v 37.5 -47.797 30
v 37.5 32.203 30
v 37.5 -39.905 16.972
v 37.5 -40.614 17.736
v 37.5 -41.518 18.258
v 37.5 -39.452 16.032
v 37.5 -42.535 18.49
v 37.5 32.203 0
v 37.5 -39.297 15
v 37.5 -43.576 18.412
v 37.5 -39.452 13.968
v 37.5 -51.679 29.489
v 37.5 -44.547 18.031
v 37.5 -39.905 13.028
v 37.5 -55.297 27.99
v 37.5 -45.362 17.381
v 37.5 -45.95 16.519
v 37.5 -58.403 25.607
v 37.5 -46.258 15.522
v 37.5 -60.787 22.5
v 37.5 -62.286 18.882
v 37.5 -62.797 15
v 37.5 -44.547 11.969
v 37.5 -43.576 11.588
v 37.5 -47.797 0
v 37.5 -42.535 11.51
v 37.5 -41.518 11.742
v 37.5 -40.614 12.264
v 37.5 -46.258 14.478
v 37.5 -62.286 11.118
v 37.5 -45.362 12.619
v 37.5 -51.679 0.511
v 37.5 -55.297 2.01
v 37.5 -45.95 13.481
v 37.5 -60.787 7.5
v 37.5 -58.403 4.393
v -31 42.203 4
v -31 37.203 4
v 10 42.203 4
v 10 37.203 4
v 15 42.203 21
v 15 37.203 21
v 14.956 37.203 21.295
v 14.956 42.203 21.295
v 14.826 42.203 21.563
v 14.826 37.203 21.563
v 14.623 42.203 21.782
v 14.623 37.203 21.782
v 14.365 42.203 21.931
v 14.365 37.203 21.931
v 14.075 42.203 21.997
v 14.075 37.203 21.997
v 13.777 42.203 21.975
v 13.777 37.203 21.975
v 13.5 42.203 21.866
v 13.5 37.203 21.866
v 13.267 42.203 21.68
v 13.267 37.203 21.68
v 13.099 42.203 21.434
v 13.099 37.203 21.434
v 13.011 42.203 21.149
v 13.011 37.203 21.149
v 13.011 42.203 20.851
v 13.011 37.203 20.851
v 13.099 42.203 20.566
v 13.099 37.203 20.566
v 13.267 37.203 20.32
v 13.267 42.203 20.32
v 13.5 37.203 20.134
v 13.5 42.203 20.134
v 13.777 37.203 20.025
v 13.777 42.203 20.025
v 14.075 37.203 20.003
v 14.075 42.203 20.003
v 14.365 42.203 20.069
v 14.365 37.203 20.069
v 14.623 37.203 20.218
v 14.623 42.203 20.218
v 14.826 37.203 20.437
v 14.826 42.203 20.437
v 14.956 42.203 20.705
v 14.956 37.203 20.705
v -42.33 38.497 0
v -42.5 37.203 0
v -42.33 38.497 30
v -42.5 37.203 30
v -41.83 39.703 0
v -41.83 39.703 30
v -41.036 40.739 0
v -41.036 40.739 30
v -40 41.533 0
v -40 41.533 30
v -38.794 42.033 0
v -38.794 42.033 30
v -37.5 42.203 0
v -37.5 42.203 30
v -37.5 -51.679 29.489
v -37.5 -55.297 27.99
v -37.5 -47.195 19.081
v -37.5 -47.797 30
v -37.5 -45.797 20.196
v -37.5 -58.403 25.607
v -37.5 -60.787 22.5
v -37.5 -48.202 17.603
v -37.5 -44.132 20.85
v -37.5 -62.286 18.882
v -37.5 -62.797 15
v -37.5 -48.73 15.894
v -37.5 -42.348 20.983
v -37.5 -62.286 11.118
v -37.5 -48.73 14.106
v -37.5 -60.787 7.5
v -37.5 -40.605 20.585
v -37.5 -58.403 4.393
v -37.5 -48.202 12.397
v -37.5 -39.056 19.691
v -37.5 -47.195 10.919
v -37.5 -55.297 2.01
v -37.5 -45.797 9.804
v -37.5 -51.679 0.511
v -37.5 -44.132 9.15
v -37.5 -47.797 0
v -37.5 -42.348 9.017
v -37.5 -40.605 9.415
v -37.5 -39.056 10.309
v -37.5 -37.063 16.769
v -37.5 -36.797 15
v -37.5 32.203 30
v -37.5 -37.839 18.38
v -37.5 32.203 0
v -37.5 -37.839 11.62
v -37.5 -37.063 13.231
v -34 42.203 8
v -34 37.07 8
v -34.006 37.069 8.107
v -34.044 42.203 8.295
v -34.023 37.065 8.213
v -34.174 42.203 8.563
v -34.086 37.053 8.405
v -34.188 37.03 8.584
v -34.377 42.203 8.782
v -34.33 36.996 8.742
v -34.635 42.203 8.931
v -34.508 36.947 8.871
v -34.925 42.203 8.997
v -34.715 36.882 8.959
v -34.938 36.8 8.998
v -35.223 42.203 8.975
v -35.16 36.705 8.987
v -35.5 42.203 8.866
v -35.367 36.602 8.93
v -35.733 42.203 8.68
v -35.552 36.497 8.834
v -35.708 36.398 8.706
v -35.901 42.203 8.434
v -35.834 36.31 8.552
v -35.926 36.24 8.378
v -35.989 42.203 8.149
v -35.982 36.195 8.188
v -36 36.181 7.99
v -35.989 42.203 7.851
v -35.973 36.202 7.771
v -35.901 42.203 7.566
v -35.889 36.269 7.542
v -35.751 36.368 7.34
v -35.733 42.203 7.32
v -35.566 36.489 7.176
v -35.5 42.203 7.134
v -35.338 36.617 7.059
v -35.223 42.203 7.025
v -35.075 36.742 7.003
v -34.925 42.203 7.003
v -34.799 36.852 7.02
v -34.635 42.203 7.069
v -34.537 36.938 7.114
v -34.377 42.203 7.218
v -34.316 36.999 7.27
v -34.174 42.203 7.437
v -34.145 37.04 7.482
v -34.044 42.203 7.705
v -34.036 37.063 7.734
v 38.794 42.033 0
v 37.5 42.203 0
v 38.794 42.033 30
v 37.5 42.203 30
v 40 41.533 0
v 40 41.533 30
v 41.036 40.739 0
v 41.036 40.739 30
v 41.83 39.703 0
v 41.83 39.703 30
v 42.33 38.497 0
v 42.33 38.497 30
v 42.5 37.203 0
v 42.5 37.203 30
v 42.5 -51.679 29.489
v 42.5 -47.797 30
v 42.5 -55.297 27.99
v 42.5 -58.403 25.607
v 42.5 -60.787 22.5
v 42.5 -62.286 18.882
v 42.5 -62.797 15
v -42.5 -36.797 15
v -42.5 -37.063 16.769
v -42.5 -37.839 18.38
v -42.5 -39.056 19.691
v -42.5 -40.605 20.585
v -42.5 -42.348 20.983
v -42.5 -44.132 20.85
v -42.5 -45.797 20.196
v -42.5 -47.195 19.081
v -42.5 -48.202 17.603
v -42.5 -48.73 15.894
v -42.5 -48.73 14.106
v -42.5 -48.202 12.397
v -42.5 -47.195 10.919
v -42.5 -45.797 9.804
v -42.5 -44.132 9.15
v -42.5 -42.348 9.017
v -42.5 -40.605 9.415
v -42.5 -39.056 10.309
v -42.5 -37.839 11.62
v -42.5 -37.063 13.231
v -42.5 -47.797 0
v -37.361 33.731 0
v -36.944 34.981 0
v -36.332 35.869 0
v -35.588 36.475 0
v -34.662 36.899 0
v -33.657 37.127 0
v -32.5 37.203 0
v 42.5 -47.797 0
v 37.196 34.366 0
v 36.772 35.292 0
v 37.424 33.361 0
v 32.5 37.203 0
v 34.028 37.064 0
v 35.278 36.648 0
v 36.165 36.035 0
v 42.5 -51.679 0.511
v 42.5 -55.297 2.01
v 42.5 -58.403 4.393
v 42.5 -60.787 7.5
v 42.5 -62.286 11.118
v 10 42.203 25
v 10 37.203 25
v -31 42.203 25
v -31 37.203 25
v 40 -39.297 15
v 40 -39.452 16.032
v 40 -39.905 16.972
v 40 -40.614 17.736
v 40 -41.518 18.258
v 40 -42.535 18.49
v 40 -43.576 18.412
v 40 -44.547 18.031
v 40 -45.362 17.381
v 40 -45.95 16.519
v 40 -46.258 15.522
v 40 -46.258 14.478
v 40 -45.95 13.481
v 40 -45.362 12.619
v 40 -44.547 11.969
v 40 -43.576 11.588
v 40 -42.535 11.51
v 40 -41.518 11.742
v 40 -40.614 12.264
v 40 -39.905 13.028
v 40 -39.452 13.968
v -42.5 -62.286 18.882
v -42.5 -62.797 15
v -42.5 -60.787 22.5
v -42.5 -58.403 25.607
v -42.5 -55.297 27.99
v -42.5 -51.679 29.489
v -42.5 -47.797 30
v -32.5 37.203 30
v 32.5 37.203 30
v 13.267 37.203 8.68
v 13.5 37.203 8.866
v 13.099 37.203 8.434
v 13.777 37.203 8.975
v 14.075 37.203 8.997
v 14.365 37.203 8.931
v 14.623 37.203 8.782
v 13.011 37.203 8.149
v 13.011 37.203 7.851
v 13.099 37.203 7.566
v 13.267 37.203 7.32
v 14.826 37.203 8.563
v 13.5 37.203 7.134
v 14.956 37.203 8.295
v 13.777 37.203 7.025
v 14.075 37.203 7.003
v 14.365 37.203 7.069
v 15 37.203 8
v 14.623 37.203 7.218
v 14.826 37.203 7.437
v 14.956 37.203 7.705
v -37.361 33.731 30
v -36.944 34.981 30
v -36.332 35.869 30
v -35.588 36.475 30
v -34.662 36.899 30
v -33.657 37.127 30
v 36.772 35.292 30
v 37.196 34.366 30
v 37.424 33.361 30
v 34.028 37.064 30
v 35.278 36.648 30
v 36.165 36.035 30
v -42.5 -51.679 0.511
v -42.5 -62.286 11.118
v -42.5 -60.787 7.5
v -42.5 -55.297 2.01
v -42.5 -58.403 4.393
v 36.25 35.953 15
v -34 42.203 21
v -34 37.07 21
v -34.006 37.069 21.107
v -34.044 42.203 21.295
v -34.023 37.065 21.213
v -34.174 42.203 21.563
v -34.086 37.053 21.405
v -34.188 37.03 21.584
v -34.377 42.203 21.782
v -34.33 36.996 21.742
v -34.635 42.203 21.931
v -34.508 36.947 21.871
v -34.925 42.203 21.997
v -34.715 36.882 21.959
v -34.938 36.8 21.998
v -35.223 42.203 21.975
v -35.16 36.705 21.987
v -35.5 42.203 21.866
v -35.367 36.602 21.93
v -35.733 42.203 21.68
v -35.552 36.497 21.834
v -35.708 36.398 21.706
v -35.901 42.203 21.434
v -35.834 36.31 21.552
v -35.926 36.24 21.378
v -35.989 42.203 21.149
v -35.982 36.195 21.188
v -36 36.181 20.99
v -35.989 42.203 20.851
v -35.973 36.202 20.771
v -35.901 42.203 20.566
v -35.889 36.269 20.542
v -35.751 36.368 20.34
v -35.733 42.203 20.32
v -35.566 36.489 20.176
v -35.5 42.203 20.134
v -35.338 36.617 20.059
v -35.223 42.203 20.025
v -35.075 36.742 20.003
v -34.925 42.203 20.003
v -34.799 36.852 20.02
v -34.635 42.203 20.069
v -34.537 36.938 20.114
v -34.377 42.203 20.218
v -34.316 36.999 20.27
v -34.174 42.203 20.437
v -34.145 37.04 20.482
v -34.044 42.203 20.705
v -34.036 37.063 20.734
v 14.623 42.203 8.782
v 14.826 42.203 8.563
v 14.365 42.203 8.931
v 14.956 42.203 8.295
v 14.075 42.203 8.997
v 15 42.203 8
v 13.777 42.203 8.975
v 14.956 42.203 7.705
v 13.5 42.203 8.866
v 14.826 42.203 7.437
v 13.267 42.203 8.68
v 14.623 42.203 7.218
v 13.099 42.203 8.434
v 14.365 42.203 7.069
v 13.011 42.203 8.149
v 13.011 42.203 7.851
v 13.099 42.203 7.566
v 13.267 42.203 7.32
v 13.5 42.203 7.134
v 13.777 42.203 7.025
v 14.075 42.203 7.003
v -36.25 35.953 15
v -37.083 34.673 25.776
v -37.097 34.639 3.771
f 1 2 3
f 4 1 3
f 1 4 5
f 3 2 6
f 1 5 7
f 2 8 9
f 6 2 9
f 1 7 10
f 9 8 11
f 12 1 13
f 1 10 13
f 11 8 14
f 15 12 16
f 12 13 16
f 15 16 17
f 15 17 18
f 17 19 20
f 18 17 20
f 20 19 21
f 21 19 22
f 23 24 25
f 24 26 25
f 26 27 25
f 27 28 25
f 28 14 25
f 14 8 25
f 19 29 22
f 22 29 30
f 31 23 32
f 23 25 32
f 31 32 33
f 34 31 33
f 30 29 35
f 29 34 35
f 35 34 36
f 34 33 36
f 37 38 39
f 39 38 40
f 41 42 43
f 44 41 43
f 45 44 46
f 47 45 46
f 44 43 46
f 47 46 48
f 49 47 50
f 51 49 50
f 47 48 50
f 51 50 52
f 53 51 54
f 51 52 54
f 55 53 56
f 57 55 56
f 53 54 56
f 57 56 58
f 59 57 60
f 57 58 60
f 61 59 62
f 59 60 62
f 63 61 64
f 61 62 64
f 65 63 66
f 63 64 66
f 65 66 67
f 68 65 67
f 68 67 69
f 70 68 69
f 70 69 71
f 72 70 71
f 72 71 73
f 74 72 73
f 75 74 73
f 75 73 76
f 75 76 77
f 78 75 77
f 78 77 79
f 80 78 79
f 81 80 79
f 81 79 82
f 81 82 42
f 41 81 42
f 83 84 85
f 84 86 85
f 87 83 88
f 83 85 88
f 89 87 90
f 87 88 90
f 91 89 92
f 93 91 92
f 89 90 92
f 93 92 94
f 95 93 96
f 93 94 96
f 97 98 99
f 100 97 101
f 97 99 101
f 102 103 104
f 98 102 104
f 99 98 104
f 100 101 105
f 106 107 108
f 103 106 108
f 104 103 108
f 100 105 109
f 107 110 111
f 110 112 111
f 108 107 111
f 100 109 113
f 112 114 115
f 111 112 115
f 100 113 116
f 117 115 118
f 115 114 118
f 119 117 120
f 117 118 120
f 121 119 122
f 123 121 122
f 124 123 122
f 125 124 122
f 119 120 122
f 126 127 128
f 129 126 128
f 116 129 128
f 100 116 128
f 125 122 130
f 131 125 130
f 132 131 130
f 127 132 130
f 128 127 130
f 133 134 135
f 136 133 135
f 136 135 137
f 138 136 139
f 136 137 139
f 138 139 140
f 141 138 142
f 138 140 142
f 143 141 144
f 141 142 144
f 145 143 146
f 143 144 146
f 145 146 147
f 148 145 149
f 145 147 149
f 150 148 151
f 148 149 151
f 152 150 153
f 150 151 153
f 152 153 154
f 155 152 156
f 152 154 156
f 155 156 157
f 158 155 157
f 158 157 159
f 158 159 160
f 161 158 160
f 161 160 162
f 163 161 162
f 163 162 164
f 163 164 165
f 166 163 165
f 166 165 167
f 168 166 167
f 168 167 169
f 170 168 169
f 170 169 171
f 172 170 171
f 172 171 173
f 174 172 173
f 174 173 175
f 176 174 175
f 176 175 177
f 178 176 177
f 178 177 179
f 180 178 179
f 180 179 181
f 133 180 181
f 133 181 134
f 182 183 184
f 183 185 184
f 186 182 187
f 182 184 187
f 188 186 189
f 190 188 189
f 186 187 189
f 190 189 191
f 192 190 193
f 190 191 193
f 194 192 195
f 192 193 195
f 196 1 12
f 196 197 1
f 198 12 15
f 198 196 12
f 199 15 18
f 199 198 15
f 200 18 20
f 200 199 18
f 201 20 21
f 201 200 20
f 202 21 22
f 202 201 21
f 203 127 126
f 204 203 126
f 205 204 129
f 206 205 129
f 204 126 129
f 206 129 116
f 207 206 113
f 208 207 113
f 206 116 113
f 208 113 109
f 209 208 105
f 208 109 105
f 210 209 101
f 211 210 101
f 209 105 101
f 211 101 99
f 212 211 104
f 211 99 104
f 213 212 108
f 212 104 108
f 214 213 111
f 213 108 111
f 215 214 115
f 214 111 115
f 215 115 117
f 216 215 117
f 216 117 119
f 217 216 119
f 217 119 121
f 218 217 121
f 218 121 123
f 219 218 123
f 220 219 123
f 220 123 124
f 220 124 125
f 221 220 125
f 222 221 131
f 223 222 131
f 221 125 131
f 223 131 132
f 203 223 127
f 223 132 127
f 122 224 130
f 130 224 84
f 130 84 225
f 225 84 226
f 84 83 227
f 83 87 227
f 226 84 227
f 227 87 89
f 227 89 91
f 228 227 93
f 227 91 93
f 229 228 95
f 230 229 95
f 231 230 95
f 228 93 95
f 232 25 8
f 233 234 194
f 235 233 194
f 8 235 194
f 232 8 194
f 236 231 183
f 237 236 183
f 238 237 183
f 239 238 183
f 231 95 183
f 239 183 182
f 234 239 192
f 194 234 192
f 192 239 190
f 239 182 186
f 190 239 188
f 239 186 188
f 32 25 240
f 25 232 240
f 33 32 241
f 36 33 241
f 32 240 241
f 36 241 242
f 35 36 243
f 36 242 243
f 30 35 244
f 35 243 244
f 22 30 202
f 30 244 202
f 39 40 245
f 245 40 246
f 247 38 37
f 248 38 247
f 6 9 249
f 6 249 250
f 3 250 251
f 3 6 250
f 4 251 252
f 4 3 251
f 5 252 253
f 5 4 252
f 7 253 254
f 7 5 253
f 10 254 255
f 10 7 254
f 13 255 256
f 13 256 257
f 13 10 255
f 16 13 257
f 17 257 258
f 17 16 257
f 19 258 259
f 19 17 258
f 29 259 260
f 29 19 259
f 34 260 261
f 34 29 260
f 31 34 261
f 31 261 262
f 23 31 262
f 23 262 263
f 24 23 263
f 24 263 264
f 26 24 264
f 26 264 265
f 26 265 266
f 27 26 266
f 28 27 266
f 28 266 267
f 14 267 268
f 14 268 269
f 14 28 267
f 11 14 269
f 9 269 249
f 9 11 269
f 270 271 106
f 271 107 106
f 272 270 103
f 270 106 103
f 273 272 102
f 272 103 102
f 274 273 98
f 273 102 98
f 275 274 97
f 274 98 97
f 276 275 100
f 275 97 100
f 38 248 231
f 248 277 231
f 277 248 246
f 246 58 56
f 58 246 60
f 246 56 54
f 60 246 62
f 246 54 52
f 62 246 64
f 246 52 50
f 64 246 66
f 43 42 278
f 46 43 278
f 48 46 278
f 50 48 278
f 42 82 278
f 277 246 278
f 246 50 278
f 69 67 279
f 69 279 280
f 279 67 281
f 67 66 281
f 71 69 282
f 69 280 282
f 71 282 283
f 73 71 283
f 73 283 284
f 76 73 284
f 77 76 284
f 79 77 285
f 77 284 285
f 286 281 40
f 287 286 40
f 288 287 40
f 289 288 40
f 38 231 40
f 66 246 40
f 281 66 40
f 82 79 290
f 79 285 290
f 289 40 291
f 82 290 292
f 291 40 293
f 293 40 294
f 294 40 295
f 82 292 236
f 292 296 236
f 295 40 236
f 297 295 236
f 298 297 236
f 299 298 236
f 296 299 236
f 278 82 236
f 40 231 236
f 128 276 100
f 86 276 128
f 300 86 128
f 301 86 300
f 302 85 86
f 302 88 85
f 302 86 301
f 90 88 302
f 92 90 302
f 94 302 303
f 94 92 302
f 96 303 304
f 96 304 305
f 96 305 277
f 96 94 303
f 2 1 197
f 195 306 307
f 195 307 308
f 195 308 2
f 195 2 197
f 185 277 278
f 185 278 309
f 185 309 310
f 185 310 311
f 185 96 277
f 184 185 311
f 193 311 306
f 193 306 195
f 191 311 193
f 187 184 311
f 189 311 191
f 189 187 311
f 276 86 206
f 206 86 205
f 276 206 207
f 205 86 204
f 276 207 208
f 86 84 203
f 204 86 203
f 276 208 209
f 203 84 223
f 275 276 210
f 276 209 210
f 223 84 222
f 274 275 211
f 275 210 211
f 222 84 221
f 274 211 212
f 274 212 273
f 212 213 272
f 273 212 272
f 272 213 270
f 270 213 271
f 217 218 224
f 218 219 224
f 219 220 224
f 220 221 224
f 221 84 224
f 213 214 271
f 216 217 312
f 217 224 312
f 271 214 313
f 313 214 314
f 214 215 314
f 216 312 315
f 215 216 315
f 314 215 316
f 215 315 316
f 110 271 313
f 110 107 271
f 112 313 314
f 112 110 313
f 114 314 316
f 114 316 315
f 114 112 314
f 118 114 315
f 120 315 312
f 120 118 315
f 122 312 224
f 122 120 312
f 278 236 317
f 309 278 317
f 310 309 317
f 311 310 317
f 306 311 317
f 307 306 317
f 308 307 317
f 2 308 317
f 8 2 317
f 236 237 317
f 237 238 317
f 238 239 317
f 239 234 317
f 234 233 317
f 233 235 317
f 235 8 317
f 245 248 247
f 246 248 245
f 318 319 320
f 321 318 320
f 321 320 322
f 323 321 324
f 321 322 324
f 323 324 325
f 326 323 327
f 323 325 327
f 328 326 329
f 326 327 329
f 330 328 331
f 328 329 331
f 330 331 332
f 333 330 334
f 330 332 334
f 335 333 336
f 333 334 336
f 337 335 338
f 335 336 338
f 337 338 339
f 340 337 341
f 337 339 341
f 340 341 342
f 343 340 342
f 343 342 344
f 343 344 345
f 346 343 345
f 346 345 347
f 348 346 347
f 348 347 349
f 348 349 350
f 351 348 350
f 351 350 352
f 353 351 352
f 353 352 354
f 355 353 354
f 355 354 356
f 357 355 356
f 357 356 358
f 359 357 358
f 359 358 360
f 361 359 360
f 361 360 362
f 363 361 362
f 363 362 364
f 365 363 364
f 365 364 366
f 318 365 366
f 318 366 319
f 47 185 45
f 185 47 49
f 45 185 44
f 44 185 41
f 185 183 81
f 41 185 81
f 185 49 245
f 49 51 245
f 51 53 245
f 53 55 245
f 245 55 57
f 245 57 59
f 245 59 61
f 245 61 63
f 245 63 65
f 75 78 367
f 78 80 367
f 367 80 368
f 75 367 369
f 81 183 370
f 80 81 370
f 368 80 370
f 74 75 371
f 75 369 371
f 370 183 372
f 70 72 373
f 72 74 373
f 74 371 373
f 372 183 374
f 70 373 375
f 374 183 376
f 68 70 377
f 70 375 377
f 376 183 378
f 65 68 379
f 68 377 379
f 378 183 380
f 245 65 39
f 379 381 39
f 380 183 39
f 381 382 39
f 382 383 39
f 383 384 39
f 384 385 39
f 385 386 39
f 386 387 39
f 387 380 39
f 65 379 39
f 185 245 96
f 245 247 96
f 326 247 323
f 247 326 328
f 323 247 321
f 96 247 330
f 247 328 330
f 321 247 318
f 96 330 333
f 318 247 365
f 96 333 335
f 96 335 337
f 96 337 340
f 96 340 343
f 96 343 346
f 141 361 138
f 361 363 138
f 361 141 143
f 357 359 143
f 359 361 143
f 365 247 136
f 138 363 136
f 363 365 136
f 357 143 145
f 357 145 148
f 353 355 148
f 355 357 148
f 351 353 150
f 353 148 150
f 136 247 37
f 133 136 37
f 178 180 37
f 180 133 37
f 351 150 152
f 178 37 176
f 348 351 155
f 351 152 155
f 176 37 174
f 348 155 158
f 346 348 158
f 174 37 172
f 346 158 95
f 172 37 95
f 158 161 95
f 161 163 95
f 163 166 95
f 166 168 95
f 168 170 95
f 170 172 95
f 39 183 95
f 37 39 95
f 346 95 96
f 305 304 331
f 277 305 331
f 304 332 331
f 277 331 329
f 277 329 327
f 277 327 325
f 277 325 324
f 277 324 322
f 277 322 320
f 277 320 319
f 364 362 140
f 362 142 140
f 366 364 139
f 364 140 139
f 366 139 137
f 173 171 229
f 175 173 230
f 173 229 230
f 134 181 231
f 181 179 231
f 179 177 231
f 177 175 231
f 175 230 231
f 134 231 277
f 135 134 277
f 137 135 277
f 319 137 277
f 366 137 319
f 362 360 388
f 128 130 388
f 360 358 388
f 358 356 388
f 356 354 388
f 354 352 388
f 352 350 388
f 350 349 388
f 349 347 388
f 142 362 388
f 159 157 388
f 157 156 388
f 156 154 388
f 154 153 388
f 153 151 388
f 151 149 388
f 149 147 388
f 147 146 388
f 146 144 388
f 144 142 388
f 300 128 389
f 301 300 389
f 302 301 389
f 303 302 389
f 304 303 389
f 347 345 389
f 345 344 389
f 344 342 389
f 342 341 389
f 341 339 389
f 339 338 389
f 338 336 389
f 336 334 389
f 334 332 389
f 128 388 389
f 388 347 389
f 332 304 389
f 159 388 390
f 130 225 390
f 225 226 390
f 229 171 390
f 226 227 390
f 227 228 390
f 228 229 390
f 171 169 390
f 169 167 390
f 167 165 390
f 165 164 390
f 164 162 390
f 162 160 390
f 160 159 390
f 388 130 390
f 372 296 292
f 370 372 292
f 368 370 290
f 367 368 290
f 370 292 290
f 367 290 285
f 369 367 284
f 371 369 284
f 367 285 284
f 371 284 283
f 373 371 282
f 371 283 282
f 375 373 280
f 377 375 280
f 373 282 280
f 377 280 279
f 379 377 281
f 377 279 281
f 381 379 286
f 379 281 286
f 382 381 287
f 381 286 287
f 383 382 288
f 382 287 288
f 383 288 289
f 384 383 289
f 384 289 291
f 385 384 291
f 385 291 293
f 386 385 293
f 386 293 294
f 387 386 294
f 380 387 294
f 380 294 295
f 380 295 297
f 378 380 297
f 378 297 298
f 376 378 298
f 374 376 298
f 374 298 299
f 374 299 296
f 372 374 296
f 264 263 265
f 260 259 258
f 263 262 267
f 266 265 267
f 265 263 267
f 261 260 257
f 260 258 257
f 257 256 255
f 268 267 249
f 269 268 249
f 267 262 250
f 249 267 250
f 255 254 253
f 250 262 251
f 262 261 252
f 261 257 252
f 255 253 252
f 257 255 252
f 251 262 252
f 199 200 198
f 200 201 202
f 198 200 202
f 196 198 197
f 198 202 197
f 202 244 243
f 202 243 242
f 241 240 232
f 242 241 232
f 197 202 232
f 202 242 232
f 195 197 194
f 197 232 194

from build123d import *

# Parameters (mm, degrees)
F1_DEPTH    = 30
F3_START    = 37.5
F2_R        = 3.5
F3_DEPTH    = 2.5
F5_START    = -37.5
F4_R        = 6
F5_DEPTH    = 5
F6_R        = 14.99999
F7_R        = 5
F8_T1_DEPTH = 30
F10_START   = -33
F9_W        = 41
F9_H        = 21
F10_DEPTH   = 12
F12_START   = -35
F11_R       = 1
F12_DEPTH   = 10


# Not quite as in the source:
# - a fillet or chamfer that OpenCascade refuses, or shapes differently, is made with other operations: its cross-section is extruded or revolved along the edge and cut away or added
# - a fillet or chamfer is up to 0.001 mm smaller than in the source, because OpenCascade refuses the exact size


with BuildPart() as f1:
    # F0 (on Top) → F1 (new body)
    with BuildSketch(Plane.XY):
        Polygon((-42.5, -62.7966840421), (-37.5, -62.7966840421), (-37.5, 37.2033159579), (37.5, 37.2033159579), (37.5, -62.7966840421), (42.5, -62.7966840421), (42.5, 42.2033159579), (-42.5, 42.2033159579), align=None)
    extrude(amount=F1_DEPTH)

    # F2 (on Right) → F3 (cut)
    with BuildSketch(Plane.YZ.offset(F3_START)):
        with Locations((-42.7966840421, 15)):
            Circle(F2_R)
    extrude(amount=F3_DEPTH, mode=Mode.SUBTRACT)

    # F4 (on Right) → F5 (cut)
    with BuildSketch(Plane.YZ.offset(F5_START)):
        with Locations((-42.7966840421, 15)):
            Circle(F4_R)
    extrude(amount=-F5_DEPTH, mode=Mode.SUBTRACT)

    # F6 (radius 15 in the source; OpenCascade refuses exactly that, so slightly less here)
    f6_edges = [f1.edges().sort_by_distance(p)[0] for p in [
        (40, -62.796684, 30),
        (40, -62.796684, 0),
        (-40, -62.796684, 30),
        (-40, -62.796684, 0),
    ]]
    fillet(f6_edges, radius=F6_R)

    # F7
    f7_edges = [f1.edges().sort_by_distance(p)[0] for p in [
        (-42.5, 42.203316, 15),
        (42.5, 42.203316, 15),
    ]]
    fillet(f7_edges, radius=F7_R)

    # F8: fillet of radius 5 on 2 edges, made by hand

    # F8_s2 → F8_t1 (join)
    with BuildSketch(Plane.XY):
        with BuildLine():
            add(Edge.make_bspline(
                [(-37.5, 32.2033159579), (-37.5, 37.2033159579), (-32.5, 37.2033159579)],
                knots=[0, 0, 0, 1, 1, 1], degree=2, weights=[1, 1, 1]))
            Line((-32.5, 37.2033159579), (-37.5, 37.2033159579))
            Line((-37.5, 37.2033159579), (-37.5, 32.2033159579))
        make_face()
        with BuildLine():
            add(Edge.make_bspline(
                [(32.5, 37.2033159579), (37.5, 37.2033159579), (37.5, 32.2033159579)],
                knots=[0, 0, 0, 1, 1, 1], degree=2, weights=[1, 1, 1]))
            Line((37.5, 32.2033159579), (37.5, 37.2033159579))
            Line((37.5, 37.2033159579), (32.5, 37.2033159579))
        make_face()
    extrude(amount=F8_T1_DEPTH)

    # F9 (on Front) → F10 (cut)
    with BuildSketch(Plane.XZ.offset(F10_START)):
        with Locations((-10.5, 14.5)):
            Rectangle(F9_W, F9_H)
    extrude(amount=-F10_DEPTH, mode=Mode.SUBTRACT)

    # F11 (on Front) → F12 (cut)
    with BuildSketch(Plane.XZ.offset(F12_START)):
        with Locations((14, 21)):
            Circle(F11_R)
        with Locations((14, 8)):
            Circle(F11_R)
        with Locations((-35, 21)):
            Circle(F11_R)
        with Locations((-35, 8)):
            Circle(F11_R)
    extrude(amount=-F12_DEPTH, mode=Mode.SUBTRACT)


solid = f1.part
